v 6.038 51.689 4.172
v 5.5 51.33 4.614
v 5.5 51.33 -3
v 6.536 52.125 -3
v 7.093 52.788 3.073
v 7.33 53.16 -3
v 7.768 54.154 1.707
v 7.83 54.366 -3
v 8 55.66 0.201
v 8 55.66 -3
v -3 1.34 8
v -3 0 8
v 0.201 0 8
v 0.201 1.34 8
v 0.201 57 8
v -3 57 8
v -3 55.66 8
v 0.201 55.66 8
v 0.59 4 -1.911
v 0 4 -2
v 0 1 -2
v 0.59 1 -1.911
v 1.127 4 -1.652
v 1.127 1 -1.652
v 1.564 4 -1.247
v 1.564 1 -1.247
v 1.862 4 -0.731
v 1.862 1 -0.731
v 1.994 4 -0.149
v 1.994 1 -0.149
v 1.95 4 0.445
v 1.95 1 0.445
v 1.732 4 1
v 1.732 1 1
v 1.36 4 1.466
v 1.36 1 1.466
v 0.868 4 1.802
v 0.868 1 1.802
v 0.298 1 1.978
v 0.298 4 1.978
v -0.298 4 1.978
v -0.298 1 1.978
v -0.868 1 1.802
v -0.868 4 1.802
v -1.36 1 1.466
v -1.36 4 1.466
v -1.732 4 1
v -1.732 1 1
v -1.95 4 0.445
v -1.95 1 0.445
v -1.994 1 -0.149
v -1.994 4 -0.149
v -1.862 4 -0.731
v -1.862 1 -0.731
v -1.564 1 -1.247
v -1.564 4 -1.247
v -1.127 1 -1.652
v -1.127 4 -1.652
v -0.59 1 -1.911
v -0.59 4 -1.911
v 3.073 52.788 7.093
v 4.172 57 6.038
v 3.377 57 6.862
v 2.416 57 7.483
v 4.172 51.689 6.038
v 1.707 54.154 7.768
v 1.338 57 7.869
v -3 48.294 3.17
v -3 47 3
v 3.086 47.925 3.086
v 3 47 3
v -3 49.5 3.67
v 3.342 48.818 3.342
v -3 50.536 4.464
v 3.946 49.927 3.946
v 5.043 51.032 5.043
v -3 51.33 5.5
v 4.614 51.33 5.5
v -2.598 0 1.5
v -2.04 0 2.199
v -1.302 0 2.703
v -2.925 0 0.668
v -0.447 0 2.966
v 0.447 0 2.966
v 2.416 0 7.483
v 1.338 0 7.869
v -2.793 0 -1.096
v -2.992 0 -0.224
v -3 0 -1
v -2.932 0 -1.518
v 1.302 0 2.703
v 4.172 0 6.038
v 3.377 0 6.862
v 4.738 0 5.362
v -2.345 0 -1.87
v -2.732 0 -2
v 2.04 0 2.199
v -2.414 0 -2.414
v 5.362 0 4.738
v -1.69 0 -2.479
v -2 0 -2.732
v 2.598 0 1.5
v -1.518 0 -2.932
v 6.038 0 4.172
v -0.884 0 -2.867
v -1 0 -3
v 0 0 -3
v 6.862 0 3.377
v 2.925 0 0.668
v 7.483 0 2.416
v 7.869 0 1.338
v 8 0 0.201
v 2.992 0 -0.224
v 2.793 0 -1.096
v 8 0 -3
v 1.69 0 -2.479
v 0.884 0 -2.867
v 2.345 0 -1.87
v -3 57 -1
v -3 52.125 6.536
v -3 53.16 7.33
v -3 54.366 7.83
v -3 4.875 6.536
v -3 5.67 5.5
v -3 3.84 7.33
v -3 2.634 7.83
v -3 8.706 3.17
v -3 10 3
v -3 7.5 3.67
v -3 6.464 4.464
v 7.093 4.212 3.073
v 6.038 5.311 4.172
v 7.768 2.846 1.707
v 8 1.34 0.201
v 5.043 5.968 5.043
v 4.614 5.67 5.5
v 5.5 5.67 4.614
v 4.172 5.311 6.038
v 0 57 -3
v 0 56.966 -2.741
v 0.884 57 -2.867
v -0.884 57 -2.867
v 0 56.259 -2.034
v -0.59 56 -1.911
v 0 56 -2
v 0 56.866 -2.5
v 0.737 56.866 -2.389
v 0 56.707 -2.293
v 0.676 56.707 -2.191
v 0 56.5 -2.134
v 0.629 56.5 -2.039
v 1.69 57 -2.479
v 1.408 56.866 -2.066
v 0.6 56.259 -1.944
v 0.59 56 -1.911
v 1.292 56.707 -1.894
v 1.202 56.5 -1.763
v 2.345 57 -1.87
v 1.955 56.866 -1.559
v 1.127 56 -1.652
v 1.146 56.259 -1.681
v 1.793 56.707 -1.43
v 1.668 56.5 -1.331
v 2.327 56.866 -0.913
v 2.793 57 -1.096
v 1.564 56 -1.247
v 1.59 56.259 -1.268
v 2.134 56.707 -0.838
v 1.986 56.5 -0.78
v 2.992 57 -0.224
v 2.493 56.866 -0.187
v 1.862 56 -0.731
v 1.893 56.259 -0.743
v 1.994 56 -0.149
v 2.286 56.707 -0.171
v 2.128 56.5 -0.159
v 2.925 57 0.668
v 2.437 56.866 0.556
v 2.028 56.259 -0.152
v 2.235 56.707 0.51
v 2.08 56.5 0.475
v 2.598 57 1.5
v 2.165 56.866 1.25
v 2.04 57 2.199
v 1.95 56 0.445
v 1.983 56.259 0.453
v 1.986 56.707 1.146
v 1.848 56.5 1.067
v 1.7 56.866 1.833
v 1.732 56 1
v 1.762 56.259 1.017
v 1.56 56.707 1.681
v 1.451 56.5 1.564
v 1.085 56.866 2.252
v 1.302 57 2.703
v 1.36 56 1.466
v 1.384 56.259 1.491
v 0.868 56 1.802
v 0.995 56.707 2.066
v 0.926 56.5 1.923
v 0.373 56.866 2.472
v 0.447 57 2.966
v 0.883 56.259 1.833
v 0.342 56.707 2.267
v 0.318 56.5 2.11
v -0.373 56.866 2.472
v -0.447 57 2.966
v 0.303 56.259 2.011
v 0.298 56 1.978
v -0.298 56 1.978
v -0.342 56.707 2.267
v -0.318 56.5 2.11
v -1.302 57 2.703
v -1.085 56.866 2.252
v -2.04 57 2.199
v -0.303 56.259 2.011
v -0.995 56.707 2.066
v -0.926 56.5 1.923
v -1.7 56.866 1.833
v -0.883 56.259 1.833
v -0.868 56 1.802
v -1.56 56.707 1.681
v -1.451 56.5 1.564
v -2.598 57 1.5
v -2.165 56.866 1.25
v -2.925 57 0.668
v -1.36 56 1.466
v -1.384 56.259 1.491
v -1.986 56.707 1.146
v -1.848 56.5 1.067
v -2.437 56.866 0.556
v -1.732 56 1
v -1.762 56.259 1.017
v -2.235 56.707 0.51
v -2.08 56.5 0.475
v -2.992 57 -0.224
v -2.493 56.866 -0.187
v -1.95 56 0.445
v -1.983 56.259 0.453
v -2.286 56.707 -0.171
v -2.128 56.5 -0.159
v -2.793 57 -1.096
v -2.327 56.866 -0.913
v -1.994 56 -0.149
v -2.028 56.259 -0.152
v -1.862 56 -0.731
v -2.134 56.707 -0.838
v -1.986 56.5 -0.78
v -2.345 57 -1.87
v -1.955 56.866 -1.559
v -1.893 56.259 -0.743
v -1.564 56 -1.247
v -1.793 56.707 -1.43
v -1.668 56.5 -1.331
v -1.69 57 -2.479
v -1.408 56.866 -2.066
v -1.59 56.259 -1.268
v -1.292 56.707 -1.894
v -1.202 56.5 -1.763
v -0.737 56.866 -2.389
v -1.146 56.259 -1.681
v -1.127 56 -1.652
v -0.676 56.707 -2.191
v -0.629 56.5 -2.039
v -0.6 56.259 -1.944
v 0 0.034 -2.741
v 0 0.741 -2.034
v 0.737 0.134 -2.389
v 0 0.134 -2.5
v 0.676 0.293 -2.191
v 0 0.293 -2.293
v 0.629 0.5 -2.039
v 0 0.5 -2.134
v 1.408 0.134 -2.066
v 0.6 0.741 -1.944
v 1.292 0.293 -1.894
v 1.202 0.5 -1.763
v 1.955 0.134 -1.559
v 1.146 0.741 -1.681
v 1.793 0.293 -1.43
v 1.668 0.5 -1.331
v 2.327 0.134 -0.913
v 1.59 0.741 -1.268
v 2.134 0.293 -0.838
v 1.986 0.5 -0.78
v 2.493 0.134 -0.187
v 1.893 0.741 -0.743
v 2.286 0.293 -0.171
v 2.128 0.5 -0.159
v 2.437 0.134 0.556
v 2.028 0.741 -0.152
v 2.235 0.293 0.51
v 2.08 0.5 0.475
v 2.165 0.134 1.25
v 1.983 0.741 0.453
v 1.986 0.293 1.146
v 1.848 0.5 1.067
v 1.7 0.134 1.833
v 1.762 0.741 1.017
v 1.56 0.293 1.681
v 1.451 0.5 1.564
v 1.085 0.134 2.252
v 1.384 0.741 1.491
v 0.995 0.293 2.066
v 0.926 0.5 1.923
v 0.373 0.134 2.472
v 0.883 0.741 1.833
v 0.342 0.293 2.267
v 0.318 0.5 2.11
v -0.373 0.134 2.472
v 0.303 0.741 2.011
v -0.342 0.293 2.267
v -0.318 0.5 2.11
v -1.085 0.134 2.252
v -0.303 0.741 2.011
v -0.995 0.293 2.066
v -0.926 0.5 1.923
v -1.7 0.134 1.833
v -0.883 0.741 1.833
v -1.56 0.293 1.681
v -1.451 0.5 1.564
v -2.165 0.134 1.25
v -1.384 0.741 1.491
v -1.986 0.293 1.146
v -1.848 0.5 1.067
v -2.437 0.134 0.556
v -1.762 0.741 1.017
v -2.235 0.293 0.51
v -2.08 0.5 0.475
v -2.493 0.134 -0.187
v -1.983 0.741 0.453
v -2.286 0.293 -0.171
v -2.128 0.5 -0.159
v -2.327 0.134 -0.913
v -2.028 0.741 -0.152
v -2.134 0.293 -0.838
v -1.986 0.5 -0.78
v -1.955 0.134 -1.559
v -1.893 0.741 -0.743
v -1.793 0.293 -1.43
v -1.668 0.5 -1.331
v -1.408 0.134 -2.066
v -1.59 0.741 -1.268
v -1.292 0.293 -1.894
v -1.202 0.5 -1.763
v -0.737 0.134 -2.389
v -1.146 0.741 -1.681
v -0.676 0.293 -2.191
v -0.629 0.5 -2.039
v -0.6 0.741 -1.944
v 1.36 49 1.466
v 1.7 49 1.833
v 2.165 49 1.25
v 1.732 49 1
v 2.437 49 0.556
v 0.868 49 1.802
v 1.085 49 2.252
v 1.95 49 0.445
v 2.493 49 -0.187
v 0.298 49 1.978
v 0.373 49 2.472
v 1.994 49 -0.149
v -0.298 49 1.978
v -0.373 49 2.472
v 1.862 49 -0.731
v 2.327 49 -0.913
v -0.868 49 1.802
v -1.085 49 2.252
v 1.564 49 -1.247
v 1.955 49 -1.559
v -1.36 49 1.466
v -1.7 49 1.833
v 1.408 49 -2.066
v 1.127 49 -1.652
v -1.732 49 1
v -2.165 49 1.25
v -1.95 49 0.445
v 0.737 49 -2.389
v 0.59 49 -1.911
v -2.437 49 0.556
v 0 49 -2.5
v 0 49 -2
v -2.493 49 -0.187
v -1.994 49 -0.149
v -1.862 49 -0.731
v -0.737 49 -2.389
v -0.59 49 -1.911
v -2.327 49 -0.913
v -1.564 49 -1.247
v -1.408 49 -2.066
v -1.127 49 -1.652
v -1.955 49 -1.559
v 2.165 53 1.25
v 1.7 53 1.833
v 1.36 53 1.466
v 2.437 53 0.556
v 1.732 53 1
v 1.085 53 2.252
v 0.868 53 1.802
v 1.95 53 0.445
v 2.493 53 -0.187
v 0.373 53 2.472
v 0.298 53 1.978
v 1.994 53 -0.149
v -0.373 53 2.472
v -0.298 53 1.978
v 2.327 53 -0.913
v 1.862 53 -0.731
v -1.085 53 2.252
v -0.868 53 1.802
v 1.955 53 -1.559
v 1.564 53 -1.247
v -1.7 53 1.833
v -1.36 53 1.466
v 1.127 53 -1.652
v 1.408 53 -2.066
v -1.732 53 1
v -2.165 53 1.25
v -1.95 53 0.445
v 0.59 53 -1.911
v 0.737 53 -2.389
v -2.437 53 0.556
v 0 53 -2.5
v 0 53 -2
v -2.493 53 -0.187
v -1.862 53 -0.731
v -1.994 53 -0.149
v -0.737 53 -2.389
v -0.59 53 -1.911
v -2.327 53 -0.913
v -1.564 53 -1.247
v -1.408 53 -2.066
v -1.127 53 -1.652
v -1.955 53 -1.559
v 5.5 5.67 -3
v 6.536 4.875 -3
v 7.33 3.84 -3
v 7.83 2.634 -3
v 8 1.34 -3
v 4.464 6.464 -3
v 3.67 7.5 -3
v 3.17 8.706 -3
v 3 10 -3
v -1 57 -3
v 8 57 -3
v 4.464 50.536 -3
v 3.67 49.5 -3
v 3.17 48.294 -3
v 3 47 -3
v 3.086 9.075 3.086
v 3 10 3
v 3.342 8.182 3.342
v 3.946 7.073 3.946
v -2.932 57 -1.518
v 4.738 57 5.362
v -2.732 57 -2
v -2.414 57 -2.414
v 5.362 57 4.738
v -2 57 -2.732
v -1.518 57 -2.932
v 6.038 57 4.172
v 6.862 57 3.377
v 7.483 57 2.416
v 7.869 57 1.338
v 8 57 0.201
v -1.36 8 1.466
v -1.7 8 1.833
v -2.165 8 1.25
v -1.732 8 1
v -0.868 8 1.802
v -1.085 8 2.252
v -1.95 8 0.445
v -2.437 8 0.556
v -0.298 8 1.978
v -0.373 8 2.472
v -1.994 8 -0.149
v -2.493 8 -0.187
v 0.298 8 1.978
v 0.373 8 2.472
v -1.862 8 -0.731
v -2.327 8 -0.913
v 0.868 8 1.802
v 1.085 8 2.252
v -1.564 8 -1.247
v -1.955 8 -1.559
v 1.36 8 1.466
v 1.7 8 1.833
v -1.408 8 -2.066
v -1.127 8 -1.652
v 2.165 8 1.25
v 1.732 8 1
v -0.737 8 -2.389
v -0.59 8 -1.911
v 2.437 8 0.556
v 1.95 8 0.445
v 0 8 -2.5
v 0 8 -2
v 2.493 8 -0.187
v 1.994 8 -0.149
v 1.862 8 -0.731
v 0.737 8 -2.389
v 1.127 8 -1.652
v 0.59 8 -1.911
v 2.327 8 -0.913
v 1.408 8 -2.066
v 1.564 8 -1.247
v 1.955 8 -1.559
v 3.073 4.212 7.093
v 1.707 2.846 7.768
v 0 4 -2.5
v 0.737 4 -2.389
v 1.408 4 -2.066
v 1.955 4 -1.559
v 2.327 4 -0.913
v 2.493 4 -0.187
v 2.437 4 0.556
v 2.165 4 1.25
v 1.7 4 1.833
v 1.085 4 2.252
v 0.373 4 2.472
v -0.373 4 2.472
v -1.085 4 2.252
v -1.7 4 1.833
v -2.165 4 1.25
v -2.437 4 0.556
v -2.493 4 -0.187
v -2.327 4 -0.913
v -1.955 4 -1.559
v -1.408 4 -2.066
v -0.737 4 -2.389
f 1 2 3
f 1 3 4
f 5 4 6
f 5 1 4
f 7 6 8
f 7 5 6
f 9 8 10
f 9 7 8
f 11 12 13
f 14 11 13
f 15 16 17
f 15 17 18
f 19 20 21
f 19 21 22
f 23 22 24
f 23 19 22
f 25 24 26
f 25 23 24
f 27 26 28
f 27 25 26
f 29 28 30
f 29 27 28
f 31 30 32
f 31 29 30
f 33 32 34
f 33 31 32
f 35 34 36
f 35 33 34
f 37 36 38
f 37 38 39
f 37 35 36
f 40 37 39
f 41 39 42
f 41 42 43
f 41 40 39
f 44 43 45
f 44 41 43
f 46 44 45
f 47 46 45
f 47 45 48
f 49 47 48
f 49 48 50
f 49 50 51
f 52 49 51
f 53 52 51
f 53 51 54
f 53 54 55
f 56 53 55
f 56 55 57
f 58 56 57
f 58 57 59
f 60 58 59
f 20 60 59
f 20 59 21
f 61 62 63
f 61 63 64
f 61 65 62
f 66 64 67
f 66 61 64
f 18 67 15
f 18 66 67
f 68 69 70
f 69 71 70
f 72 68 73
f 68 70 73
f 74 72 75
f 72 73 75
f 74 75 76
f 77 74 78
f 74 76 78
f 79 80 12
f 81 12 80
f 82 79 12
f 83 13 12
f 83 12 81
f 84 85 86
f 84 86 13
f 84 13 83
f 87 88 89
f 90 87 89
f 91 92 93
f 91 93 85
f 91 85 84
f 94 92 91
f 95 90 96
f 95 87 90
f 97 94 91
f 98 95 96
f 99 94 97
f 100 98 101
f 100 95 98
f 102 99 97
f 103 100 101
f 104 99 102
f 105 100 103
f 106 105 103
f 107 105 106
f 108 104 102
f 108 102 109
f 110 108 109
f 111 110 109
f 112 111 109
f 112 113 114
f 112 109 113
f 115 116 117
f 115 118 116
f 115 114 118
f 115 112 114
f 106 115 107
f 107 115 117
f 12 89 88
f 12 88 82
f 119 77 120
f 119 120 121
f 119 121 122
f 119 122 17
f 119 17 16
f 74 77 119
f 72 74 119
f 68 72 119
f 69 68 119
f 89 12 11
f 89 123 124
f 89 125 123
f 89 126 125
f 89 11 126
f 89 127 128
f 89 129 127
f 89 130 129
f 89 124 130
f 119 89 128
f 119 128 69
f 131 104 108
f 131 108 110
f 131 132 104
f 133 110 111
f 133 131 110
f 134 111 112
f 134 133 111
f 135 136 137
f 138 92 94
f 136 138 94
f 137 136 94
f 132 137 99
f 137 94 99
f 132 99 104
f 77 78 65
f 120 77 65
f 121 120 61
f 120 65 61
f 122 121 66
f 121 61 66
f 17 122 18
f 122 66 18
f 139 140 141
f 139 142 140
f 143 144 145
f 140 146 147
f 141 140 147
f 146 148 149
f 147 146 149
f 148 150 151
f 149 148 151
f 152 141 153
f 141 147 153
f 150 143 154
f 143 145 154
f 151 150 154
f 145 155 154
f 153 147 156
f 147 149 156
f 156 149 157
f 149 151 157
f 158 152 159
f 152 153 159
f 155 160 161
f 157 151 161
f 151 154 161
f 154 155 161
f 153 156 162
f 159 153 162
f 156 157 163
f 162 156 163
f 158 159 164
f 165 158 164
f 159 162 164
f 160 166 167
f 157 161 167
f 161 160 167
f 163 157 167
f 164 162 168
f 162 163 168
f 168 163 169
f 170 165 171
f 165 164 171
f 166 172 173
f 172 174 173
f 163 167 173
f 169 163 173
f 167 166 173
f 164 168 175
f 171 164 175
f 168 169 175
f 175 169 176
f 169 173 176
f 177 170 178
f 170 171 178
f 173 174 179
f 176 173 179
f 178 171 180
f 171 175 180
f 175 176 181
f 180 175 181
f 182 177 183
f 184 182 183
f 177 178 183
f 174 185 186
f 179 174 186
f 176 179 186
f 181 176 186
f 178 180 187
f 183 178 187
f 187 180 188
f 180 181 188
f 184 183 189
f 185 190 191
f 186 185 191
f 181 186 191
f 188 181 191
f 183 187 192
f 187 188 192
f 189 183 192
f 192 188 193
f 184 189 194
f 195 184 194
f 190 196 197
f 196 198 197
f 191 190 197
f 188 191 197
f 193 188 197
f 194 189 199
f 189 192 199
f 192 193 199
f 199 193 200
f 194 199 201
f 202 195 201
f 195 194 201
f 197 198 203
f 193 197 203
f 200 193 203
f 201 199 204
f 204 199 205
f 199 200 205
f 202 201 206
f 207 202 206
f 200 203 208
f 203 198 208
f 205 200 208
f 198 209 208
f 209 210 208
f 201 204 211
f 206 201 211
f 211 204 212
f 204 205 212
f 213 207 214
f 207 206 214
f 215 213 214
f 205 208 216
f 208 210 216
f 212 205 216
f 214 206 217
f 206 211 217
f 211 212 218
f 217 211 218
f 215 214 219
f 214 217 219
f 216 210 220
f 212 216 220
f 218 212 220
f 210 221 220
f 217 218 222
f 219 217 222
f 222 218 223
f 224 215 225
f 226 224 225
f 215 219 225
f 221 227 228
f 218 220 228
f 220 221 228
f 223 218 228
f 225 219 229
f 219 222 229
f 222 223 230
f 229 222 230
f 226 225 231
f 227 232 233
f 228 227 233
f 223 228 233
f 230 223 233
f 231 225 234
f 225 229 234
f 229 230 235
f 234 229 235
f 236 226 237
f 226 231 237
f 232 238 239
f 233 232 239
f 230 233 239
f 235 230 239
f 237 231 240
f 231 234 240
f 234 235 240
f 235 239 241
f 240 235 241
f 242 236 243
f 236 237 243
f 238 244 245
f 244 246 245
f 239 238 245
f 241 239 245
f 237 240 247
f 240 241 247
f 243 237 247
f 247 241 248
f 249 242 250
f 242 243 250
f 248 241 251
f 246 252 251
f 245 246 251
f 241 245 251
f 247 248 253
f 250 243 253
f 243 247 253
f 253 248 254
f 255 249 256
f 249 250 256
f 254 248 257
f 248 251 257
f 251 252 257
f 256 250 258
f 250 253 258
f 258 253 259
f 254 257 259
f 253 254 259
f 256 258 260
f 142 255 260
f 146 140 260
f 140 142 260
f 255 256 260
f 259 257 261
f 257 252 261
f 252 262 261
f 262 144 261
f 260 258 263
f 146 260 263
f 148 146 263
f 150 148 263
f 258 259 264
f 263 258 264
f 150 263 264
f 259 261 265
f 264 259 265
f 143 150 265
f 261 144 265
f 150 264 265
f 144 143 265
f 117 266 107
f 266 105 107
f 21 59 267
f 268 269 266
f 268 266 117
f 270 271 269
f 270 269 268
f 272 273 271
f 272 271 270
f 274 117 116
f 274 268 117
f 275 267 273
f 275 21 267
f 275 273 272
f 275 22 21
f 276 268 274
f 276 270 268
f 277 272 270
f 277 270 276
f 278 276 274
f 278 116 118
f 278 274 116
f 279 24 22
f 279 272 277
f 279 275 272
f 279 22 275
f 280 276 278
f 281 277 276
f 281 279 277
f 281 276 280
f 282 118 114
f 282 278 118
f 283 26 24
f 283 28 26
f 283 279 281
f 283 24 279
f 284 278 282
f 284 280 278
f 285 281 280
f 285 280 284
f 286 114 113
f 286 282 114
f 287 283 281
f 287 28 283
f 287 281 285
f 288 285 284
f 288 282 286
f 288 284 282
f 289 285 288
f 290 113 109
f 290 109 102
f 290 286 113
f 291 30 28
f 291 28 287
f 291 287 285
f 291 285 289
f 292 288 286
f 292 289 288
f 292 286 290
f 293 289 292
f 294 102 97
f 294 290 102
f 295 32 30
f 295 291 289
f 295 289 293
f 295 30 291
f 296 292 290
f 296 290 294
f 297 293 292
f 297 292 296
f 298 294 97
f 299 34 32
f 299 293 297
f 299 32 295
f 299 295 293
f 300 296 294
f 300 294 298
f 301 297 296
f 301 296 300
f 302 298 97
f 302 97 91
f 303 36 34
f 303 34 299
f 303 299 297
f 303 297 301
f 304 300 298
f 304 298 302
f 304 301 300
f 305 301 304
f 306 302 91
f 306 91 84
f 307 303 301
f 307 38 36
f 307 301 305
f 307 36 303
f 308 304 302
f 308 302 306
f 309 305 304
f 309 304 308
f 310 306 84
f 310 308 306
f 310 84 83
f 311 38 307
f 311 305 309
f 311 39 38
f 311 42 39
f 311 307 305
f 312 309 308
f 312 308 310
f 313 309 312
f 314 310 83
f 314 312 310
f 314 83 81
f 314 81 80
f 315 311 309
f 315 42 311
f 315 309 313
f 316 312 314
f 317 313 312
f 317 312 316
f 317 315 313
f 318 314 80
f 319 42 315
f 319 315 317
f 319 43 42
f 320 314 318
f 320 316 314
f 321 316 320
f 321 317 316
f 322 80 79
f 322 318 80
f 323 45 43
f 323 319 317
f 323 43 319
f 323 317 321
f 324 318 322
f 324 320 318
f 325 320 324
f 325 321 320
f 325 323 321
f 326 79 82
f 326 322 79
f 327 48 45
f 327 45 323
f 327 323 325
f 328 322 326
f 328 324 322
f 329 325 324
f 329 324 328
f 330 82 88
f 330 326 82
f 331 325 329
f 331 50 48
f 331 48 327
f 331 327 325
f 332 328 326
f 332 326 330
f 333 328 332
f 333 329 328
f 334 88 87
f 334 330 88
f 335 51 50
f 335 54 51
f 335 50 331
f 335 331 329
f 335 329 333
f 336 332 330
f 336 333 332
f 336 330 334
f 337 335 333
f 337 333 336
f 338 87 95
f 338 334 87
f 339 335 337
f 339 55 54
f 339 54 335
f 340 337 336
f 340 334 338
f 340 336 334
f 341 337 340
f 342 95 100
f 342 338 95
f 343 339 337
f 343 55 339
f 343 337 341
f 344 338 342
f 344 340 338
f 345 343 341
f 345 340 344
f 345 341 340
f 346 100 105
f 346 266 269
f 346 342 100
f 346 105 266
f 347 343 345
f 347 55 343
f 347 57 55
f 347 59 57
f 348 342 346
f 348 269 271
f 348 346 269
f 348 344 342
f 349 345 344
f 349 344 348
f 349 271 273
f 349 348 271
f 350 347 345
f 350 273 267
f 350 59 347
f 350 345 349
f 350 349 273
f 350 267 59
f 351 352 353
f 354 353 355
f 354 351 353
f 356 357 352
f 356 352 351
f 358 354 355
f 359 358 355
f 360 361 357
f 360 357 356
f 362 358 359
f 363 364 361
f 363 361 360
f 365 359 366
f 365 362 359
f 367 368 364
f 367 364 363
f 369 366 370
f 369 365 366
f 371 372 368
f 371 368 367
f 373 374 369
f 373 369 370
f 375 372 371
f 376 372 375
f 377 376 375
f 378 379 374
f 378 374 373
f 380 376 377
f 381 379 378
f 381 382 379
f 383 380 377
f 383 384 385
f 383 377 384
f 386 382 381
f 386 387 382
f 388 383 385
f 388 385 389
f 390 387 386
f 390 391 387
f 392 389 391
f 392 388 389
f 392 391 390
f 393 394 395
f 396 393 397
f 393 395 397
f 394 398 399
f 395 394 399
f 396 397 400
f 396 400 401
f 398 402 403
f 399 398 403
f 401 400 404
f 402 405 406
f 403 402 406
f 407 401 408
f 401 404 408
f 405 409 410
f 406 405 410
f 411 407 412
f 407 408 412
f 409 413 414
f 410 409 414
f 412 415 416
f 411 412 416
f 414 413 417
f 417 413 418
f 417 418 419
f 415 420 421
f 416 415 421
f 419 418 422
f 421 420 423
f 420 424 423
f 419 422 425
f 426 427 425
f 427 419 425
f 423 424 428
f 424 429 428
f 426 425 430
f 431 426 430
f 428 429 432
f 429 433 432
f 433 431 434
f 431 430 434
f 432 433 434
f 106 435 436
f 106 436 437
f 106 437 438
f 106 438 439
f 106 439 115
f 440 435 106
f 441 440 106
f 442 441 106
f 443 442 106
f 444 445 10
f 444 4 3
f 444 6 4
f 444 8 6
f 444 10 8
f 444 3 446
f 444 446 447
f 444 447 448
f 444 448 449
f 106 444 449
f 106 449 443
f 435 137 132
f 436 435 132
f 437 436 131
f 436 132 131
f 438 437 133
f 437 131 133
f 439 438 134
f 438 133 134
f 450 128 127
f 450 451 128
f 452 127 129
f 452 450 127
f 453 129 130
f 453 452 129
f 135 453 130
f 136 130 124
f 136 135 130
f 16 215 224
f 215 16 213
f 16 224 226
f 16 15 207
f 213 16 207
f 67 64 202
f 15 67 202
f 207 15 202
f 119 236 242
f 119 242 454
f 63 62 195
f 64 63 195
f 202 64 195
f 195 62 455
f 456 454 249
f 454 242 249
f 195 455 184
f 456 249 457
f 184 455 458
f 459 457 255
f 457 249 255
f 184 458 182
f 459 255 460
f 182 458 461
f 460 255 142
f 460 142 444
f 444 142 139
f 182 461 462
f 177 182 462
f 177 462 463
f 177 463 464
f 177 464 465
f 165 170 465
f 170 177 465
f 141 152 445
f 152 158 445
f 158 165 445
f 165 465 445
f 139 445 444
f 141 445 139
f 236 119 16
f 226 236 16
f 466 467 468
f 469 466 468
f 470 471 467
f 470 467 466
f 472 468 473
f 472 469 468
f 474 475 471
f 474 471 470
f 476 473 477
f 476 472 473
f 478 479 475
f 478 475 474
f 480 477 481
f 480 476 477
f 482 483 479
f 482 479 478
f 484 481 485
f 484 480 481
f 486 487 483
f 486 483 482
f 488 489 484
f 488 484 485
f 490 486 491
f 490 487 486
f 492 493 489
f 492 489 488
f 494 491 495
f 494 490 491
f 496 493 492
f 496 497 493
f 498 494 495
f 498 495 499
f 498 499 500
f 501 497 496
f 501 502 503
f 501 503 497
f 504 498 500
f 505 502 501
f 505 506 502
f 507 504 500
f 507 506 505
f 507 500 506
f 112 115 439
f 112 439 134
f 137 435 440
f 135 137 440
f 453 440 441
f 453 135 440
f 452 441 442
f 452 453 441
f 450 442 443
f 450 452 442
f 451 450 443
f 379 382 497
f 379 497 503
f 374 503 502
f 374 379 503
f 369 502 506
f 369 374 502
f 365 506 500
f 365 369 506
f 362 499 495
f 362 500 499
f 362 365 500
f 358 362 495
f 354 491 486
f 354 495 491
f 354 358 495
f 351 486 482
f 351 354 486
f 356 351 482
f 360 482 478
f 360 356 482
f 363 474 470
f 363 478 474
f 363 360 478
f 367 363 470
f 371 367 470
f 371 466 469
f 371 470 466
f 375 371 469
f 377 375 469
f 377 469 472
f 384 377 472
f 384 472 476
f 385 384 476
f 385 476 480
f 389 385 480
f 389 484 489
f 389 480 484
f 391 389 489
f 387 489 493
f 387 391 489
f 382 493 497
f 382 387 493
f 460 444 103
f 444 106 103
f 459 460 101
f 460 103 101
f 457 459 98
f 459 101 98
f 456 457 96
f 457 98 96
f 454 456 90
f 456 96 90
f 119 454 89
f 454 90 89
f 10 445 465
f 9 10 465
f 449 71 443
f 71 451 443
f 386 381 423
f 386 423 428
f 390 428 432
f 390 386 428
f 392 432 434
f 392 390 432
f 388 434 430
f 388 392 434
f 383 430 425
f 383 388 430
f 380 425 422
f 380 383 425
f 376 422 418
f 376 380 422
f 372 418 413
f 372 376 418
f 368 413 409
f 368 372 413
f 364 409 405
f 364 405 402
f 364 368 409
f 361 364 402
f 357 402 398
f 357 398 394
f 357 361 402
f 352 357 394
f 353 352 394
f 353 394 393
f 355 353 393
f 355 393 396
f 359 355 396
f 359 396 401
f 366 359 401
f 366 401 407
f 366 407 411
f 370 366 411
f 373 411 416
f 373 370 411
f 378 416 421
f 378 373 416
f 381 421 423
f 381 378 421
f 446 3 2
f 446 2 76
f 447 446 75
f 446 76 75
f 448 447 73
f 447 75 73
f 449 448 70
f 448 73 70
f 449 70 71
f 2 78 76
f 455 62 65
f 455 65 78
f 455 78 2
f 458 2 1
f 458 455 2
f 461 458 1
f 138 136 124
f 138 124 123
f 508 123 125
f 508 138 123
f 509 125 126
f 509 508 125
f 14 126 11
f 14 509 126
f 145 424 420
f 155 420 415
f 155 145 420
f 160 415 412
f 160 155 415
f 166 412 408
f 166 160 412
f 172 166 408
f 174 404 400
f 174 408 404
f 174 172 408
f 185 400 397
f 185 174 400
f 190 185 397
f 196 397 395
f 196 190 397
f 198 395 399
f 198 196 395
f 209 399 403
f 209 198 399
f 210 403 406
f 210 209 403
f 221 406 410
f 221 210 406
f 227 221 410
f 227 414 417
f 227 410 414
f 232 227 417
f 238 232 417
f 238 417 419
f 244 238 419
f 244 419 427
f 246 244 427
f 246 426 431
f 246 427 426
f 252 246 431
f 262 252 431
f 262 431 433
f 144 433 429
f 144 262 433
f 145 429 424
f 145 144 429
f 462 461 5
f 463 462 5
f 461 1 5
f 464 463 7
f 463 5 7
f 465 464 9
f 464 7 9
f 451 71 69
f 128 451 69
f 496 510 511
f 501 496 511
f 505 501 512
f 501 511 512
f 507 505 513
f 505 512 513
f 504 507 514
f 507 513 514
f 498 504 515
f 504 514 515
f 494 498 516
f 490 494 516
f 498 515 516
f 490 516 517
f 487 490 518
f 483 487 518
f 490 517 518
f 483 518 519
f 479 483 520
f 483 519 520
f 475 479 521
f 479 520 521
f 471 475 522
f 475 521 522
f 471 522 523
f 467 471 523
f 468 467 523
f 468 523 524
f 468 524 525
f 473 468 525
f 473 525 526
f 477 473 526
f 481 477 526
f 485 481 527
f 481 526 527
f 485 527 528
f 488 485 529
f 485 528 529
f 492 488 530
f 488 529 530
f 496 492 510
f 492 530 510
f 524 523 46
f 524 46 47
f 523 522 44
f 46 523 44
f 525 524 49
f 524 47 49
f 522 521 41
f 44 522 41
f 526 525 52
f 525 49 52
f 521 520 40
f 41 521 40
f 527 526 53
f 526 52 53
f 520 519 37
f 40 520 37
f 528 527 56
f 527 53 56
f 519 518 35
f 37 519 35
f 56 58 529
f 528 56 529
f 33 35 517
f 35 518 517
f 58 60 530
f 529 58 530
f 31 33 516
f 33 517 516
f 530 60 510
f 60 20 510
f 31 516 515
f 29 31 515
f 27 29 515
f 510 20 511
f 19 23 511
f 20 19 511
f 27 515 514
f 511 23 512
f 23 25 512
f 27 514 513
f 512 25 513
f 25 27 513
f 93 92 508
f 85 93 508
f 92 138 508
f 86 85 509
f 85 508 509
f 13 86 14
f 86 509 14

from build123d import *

# Parameters (mm, degrees)
BOSS_EXTRUDE1_DEPTH = 28.5
SKETCH3_R           = 2
CUT_EXTRUDE1_DEPTH  = 29.81405906844782
SKETCH4_W           = 5.000000000000001
SKETCH4_H           = 6
SKETCH4_W_2         = 6
SKETCH4_H_2         = 5
BOSS_EXTRUDE2_DEPTH = 5
FILLET1_R           = 10
FILLET3_R           = 5
FILLET4_R           = 5
FILLET5_R           = 2
CUT_EXTRUDE2_START  = -4
SKETCH5_R           = 2.5
CUT_EXTRUDE2_DEPTH  = 4
CUT_EXTRUDE3_START  = -8
SKETCH6_R           = 2.5
CUT_EXTRUDE3_DEPTH  = 4
FILLET6_R           = 1


# Some blends are built 0.0001 mm under size
with BuildPart() as part:
    # Sketch2 → Boss-Extrude1 (new body)
    with BuildSketch(Plane(origin=(0, 0, 0), x_dir=(1, 0, 0), z_dir=(0, 1, 0))):
        Polygon((-3.000000000000001, 3), (2.999999999999999, 3), (3, -3), (-3, -3), align=None)
    extrude(amount=BOSS_EXTRUDE1_DEPTH)

    # Sketch3 → Cut-Extrude1 (cut, through all)
    with BuildSketch(Plane.XZ):
        with Locations(Location((0, 0, 0), (0, 0, 270))):
            Circle(SKETCH3_R)
    extrude(amount=-CUT_EXTRUDE1_DEPTH, mode=Mode.SUBTRACT)

    # Sketch4 → Boss-Extrude2 (add)
    with BuildSketch(Plane.XZ):
        with Locations((5.5, 0)):
            Rectangle(SKETCH4_W, SKETCH4_H)
        with Locations((0, 5.5)):
            Rectangle(SKETCH4_W_2, SKETCH4_H_2)
    extrude(amount=-BOSS_EXTRUDE2_DEPTH)

    # Fillet1
    # the kernel refuses this fillet: 10 mm, written as the material it adds along each edge
    with BuildSketch(Plane(origin=(3, 0, 3), x_dir=(3.6e-16, 0, 1), z_dir=(0, 1, 0))) as fillet1_piece_1:
        with BuildLine():
            CenterArc((9.11437827766148, 9.114378277661475), FILLET1_R, 204.29518894536457, 41.4096221092708)
            Line((1.78e-15, 5), (0, 0))
            Line((0, 0), (5, 0))
        make_face()
    extrude(amount=5)

    # Fillet3
    # the kernel refuses this fillet: 5 mm, written as the material it adds along each edge
    with BuildSketch(Plane(origin=(3, 5, 3), x_dir=(0, 0, 1), z_dir=(-1, 0, 0))) as fillet3_piece_1:
        with BuildLine():
            CenterArc((FILLET3_R, FILLET3_R), FILLET3_R, 180, 90)
            Line((-8.9e-16, FILLET3_R), (0, 0))
            Line((0, 0), (FILLET3_R, 0))
        make_face()
    extrude(amount=6)
    with BuildSketch(Plane(origin=(2.999999999999999, 5, 3), x_dir=(1, 0, 0), z_dir=(0, 0, -1))) as fillet3_piece_2:
        with BuildLine():
            CenterArc((FILLET3_R, -FILLET3_R), FILLET3_R, 90, 90)
            Line((-8.9e-16, -FILLET3_R), (0, 0))
            Line((0, 0), (FILLET3_R, 0))
        make_face()
    extrude(amount=6)
    with BuildSketch(Plane(origin=(15.5, 5, 3), x_dir=(0, 0, 1), z_dir=(-1, 0, 0))) as fillet3_piece_3a_section:
        with BuildLine():
            CenterArc((FILLET3_R, FILLET3_R), FILLET3_R, 180, 90)
            Line((-8.9e-16, FILLET3_R), (0, 0))
            Line((0, 0), (FILLET3_R, 0))
        make_face()
    fillet3_piece_3a = extrude(amount=18.5, mode=Mode.PRIVATE)
    fillet3_piece_3a = fillet3_piece_3a - Plane(origin=(12.114378277661, 5, 12.114378277661), x_dir=(0, 0, 1), z_dir=(0, -1, 0)) * Cylinder(10, 57, mode=Mode.PRIVATE)
    fillet3_piece_3a = split(fillet3_piece_3a, bisect_by=Plane(origin=(8, 5, 3), z_dir=(-1, 0, 0)), keep=Keep.TOP, mode=Mode.PRIVATE)
    fillet3_piece_3a = split(fillet3_piece_3a, bisect_by=Plane(origin=(3, 5, 3.0000000000000018), z_dir=(1, 0, -1.5e-16)), keep=Keep.TOP, mode=Mode.PRIVATE)
    with BuildSketch(Plane(origin=(2.999999999999999, 5, 15.5), x_dir=(1, 0, 0), z_dir=(0, 0, -1))) as fillet3_piece_3b_section:
        with BuildLine():
            CenterArc((FILLET3_R, -FILLET3_R), FILLET3_R, 90, 90)
            Line((-8.9e-16, -FILLET3_R), (0, 0))
            Line((0, 0), (FILLET3_R, 0))
        make_face()
    fillet3_piece_3b = extrude(amount=18.5, mode=Mode.PRIVATE)
    fillet3_piece_3b = fillet3_piece_3b - Plane(origin=(12.114378277661, 5, 12.114378277661), x_dir=(0, 0, 1), z_dir=(0, -1, 0)) * Cylinder(10, 57, mode=Mode.PRIVATE)
    fillet3_piece_3b = split(fillet3_piece_3b, bisect_by=Plane(origin=(2.999999999999999, 5, 8), z_dir=(0, 0, -1)), keep=Keep.TOP, mode=Mode.PRIVATE)
    fillet3_piece_3b = split(fillet3_piece_3b, bisect_by=Plane(origin=(2.999999999999999, 5, 3), z_dir=(0, 0, 1)), keep=Keep.TOP, mode=Mode.PRIVATE)
    fillet3_piece_3 = fillet3_piece_3a & fillet3_piece_3b
    add(fillet3_piece_3)

    # Fillet4
    fillet4_edges = [part.edges().sort_by_distance(p)[0] for p in [
        (8, 2.5, 3),
        (8, 5, 0),
        (3, 2.5, 8),
        (0, 5, 8),
    ]]
    fillet(fillet4_edges, radius=FILLET4_R)

    # Mirror1: part across plane


with BuildPart() as part_1:
    add(part.part)
    add(part.part.mirror(Plane.ZX.offset(28.5)))

    # Fillet5
    fillet5_edges = [part_1.edges().sort_by_distance(p)[0] for p in [
        (-3.000000000000001, 28.5, -3),
    ]]
    fillet(fillet5_edges, radius=FILLET5_R)

    # Sketch5 → Cut-Extrude2 (cut)
    with BuildSketch(Plane.XZ.offset(CUT_EXTRUDE2_START)):
        with Locations(Location((0, 0, 0), (0, 0, 270))):
            Circle(SKETCH5_R)
    extrude(amount=-CUT_EXTRUDE2_DEPTH, mode=Mode.SUBTRACT)

    # Sketch6 → Cut-Extrude3 (cut)
    with BuildSketch(Plane(origin=(0, 57, 0), x_dir=(1, 0, 0), z_dir=(0, 1, 0)).offset(CUT_EXTRUDE3_START)):
        with Locations(Location((0, 0, 0), (0, 0, 90))):
            Circle(SKETCH6_R)
    extrude(amount=CUT_EXTRUDE3_DEPTH, mode=Mode.SUBTRACT)

    # Fillet6
    fillet6_edges = [part_1.edges().sort_by_distance(p)[0] for p in [
        (6.1e-16, 57, 2),
        (6.1e-16, 0, 2),
    ]]
    fillet(fillet6_edges, radius=FILLET6_R - 0.0001)  # a hair under: the kernel refuses the full size


solid = part_1.part
